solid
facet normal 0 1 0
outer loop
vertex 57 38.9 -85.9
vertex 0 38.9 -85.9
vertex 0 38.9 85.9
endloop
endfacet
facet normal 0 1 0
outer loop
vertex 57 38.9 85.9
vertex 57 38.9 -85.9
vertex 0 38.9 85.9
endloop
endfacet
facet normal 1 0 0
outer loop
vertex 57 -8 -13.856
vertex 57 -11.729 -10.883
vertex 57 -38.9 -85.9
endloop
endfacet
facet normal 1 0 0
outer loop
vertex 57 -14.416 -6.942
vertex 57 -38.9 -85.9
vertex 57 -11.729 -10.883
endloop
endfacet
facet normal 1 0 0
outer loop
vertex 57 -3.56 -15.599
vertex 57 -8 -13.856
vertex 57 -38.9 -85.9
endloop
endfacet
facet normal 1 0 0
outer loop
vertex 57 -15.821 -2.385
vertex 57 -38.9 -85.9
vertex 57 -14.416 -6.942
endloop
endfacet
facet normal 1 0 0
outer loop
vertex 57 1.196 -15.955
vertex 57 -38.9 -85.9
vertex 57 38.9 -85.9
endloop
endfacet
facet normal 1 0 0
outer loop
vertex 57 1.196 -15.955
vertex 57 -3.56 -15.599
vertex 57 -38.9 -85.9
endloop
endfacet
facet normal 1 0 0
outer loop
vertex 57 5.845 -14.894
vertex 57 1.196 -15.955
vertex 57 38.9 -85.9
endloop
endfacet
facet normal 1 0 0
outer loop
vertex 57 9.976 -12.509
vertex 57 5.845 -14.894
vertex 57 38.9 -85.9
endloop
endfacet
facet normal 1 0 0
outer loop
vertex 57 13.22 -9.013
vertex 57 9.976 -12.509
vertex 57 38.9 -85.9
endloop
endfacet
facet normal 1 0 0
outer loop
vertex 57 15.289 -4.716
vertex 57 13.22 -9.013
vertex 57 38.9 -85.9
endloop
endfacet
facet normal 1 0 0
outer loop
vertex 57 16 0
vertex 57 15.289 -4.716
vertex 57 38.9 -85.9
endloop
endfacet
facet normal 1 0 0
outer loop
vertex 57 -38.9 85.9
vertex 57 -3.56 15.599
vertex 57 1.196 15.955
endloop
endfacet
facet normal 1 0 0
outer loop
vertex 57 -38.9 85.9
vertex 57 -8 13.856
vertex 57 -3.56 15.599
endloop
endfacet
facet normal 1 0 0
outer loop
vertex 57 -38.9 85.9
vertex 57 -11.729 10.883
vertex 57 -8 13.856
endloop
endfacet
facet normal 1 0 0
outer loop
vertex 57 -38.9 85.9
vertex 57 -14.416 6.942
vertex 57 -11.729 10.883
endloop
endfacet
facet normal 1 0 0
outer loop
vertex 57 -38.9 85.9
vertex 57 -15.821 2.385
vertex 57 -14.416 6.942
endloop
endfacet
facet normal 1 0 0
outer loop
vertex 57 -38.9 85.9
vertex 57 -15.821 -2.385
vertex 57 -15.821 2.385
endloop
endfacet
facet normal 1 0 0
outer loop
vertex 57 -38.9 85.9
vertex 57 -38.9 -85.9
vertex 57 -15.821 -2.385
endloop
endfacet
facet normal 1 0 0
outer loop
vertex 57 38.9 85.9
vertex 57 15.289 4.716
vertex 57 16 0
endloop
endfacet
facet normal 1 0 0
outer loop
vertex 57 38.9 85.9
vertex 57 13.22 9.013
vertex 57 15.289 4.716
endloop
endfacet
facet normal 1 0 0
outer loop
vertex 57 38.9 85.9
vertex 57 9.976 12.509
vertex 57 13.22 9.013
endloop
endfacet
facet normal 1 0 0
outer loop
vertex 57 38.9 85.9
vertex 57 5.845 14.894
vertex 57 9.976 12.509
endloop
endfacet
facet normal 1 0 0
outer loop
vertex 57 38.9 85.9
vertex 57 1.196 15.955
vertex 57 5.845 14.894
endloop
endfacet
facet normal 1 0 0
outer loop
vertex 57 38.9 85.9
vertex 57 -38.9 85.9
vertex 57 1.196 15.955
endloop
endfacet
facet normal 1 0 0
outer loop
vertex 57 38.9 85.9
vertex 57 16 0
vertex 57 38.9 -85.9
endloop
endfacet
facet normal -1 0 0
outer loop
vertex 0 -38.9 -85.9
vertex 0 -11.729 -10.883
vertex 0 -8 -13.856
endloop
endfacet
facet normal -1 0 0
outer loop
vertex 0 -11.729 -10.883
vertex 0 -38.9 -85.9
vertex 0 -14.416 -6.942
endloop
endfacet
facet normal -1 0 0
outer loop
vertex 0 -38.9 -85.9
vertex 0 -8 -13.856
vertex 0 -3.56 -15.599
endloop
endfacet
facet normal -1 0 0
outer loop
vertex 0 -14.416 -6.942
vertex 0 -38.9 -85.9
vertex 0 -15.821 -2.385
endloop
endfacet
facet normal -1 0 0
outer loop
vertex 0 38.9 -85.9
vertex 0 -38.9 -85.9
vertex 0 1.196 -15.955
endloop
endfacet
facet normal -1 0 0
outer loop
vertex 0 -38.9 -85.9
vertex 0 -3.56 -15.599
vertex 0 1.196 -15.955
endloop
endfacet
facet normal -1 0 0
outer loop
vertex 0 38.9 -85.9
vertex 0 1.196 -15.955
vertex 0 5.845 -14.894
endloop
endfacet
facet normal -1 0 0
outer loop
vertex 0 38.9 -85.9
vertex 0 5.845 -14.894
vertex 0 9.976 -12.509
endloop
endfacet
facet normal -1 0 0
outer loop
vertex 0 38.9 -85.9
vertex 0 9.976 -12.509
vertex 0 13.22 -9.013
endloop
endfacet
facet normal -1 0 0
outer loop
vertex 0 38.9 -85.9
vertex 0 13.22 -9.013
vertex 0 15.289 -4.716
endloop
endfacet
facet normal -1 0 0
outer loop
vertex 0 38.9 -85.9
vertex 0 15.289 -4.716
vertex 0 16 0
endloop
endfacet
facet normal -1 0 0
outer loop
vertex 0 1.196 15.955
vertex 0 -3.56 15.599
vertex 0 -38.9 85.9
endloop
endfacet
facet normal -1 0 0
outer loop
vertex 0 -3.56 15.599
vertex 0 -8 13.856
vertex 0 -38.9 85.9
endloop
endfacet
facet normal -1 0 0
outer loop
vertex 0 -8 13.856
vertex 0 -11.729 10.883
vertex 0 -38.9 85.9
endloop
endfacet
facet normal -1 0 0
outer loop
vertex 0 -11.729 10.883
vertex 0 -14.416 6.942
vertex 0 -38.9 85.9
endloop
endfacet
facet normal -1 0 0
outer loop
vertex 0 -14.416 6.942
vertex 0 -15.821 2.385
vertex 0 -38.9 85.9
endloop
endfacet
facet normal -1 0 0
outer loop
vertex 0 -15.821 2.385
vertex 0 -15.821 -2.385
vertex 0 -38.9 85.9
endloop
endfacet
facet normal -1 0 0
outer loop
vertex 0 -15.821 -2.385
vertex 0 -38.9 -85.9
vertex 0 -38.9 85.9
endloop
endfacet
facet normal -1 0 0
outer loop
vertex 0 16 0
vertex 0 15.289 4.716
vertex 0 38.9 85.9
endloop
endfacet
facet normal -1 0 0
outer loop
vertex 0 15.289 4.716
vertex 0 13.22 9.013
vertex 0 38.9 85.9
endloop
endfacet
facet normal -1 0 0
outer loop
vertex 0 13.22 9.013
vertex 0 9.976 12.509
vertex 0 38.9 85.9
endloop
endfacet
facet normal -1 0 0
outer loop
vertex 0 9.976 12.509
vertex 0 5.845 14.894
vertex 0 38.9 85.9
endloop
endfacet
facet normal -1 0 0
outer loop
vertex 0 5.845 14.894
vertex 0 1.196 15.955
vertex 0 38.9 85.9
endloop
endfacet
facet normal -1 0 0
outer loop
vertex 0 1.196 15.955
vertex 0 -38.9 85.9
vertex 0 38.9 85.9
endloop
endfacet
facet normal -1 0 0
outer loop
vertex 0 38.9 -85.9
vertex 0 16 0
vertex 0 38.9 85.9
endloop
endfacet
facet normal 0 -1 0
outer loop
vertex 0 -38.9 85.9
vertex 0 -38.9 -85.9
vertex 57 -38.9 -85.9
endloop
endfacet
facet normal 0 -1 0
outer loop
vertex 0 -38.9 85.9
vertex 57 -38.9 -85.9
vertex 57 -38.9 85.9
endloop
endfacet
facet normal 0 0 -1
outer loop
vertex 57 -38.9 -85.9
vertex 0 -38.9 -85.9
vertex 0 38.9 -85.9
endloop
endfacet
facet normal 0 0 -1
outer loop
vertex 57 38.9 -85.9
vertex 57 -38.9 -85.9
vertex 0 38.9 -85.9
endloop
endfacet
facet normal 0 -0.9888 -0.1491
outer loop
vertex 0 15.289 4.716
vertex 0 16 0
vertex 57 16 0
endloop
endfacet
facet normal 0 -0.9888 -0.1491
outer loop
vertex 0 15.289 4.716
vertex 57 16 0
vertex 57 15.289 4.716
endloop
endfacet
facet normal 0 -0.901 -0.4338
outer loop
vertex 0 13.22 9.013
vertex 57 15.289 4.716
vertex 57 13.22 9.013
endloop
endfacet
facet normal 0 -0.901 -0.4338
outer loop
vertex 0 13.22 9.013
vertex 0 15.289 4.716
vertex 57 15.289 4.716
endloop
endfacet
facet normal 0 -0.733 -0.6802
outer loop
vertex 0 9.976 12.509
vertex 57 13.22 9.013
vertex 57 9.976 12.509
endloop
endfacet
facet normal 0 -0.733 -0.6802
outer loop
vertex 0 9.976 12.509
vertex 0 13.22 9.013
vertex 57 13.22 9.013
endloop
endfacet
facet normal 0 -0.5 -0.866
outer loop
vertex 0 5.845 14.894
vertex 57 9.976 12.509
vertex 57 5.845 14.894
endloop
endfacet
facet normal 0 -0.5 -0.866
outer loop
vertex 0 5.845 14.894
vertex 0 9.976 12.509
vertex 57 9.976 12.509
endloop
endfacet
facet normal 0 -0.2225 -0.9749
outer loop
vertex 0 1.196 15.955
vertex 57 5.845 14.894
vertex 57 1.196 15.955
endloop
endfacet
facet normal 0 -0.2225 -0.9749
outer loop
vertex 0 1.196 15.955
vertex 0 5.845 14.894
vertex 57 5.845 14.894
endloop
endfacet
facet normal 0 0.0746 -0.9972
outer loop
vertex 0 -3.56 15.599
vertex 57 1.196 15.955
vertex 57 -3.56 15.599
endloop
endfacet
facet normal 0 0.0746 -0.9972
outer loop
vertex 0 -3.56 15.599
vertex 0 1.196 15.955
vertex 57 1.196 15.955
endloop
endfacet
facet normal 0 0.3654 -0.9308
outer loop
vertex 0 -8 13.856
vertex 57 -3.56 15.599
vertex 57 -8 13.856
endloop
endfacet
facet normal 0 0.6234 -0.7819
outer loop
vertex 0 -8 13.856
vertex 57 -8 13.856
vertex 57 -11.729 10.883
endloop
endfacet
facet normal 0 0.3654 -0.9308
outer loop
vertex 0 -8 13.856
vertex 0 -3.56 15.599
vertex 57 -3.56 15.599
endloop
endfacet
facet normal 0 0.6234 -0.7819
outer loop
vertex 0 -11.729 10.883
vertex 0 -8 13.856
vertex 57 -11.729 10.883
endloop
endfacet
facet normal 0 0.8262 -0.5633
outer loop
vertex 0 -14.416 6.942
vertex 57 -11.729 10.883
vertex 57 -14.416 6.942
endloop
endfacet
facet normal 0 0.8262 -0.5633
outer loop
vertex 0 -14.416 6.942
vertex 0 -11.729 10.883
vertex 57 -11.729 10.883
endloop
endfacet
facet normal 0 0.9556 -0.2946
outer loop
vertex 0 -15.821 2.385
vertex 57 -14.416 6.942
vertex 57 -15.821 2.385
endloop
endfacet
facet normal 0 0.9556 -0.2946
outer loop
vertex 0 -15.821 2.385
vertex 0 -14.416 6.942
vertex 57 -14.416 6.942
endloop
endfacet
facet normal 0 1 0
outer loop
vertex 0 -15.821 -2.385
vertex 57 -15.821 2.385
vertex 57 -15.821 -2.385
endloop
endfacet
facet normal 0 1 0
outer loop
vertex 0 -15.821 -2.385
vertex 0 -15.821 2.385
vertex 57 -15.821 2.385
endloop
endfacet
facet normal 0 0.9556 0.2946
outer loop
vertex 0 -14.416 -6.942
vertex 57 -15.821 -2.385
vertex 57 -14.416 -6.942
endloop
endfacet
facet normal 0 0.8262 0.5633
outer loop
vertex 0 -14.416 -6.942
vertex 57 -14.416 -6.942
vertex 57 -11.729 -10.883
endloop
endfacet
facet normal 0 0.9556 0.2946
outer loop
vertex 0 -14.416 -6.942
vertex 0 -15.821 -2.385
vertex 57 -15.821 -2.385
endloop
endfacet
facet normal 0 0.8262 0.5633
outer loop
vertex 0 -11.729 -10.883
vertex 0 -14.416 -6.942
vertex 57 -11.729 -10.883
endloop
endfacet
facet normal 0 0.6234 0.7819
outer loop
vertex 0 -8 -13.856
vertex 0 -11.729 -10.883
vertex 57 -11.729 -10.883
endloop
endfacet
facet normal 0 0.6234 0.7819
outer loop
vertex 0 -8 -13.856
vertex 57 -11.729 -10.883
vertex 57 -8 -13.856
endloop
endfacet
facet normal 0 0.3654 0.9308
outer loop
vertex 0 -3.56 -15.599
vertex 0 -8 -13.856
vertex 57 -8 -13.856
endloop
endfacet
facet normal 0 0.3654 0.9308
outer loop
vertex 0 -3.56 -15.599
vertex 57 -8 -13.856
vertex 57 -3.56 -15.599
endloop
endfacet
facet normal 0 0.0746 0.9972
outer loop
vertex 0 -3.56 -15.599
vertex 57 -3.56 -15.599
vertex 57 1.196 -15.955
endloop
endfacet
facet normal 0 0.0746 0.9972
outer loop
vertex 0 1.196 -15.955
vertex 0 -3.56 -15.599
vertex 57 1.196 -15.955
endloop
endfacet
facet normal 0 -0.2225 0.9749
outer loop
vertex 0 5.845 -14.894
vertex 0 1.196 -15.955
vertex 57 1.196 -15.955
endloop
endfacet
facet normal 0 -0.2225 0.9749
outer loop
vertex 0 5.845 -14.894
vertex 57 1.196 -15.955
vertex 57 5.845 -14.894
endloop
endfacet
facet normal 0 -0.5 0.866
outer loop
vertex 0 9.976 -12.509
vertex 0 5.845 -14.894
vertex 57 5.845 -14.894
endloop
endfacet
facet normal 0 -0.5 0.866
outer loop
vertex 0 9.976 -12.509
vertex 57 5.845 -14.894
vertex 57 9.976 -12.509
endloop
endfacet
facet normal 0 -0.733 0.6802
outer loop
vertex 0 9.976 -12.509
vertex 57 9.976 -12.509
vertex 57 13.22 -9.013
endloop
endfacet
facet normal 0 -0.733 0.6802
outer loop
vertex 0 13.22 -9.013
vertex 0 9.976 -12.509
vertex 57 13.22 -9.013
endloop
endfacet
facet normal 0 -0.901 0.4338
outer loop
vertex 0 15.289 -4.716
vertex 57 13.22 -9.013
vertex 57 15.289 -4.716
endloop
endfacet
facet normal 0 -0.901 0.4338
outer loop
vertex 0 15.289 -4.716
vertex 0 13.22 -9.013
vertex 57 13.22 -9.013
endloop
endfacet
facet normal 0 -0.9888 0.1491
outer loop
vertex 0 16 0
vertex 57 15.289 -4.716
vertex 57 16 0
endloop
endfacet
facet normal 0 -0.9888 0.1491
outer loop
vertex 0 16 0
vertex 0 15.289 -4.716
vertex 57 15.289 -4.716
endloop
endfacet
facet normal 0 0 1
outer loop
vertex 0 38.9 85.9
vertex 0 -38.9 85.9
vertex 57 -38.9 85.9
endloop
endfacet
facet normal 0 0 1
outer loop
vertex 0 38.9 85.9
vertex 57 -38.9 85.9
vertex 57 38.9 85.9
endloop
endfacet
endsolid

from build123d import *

# Parameters (mm, degrees)
F0_W     = 77.8
F0_H     = 171.8
F0_R     = 16
F1_DEPTH = 57


with BuildPart() as f1:
    # F0 (on Right) → F1 (new body)
    with BuildSketch(Plane.YZ):
        Rectangle(F0_W, F0_H)
        Circle(F0_R, mode=Mode.SUBTRACT)
    extrude(amount=F1_DEPTH)


solid = f1.part
